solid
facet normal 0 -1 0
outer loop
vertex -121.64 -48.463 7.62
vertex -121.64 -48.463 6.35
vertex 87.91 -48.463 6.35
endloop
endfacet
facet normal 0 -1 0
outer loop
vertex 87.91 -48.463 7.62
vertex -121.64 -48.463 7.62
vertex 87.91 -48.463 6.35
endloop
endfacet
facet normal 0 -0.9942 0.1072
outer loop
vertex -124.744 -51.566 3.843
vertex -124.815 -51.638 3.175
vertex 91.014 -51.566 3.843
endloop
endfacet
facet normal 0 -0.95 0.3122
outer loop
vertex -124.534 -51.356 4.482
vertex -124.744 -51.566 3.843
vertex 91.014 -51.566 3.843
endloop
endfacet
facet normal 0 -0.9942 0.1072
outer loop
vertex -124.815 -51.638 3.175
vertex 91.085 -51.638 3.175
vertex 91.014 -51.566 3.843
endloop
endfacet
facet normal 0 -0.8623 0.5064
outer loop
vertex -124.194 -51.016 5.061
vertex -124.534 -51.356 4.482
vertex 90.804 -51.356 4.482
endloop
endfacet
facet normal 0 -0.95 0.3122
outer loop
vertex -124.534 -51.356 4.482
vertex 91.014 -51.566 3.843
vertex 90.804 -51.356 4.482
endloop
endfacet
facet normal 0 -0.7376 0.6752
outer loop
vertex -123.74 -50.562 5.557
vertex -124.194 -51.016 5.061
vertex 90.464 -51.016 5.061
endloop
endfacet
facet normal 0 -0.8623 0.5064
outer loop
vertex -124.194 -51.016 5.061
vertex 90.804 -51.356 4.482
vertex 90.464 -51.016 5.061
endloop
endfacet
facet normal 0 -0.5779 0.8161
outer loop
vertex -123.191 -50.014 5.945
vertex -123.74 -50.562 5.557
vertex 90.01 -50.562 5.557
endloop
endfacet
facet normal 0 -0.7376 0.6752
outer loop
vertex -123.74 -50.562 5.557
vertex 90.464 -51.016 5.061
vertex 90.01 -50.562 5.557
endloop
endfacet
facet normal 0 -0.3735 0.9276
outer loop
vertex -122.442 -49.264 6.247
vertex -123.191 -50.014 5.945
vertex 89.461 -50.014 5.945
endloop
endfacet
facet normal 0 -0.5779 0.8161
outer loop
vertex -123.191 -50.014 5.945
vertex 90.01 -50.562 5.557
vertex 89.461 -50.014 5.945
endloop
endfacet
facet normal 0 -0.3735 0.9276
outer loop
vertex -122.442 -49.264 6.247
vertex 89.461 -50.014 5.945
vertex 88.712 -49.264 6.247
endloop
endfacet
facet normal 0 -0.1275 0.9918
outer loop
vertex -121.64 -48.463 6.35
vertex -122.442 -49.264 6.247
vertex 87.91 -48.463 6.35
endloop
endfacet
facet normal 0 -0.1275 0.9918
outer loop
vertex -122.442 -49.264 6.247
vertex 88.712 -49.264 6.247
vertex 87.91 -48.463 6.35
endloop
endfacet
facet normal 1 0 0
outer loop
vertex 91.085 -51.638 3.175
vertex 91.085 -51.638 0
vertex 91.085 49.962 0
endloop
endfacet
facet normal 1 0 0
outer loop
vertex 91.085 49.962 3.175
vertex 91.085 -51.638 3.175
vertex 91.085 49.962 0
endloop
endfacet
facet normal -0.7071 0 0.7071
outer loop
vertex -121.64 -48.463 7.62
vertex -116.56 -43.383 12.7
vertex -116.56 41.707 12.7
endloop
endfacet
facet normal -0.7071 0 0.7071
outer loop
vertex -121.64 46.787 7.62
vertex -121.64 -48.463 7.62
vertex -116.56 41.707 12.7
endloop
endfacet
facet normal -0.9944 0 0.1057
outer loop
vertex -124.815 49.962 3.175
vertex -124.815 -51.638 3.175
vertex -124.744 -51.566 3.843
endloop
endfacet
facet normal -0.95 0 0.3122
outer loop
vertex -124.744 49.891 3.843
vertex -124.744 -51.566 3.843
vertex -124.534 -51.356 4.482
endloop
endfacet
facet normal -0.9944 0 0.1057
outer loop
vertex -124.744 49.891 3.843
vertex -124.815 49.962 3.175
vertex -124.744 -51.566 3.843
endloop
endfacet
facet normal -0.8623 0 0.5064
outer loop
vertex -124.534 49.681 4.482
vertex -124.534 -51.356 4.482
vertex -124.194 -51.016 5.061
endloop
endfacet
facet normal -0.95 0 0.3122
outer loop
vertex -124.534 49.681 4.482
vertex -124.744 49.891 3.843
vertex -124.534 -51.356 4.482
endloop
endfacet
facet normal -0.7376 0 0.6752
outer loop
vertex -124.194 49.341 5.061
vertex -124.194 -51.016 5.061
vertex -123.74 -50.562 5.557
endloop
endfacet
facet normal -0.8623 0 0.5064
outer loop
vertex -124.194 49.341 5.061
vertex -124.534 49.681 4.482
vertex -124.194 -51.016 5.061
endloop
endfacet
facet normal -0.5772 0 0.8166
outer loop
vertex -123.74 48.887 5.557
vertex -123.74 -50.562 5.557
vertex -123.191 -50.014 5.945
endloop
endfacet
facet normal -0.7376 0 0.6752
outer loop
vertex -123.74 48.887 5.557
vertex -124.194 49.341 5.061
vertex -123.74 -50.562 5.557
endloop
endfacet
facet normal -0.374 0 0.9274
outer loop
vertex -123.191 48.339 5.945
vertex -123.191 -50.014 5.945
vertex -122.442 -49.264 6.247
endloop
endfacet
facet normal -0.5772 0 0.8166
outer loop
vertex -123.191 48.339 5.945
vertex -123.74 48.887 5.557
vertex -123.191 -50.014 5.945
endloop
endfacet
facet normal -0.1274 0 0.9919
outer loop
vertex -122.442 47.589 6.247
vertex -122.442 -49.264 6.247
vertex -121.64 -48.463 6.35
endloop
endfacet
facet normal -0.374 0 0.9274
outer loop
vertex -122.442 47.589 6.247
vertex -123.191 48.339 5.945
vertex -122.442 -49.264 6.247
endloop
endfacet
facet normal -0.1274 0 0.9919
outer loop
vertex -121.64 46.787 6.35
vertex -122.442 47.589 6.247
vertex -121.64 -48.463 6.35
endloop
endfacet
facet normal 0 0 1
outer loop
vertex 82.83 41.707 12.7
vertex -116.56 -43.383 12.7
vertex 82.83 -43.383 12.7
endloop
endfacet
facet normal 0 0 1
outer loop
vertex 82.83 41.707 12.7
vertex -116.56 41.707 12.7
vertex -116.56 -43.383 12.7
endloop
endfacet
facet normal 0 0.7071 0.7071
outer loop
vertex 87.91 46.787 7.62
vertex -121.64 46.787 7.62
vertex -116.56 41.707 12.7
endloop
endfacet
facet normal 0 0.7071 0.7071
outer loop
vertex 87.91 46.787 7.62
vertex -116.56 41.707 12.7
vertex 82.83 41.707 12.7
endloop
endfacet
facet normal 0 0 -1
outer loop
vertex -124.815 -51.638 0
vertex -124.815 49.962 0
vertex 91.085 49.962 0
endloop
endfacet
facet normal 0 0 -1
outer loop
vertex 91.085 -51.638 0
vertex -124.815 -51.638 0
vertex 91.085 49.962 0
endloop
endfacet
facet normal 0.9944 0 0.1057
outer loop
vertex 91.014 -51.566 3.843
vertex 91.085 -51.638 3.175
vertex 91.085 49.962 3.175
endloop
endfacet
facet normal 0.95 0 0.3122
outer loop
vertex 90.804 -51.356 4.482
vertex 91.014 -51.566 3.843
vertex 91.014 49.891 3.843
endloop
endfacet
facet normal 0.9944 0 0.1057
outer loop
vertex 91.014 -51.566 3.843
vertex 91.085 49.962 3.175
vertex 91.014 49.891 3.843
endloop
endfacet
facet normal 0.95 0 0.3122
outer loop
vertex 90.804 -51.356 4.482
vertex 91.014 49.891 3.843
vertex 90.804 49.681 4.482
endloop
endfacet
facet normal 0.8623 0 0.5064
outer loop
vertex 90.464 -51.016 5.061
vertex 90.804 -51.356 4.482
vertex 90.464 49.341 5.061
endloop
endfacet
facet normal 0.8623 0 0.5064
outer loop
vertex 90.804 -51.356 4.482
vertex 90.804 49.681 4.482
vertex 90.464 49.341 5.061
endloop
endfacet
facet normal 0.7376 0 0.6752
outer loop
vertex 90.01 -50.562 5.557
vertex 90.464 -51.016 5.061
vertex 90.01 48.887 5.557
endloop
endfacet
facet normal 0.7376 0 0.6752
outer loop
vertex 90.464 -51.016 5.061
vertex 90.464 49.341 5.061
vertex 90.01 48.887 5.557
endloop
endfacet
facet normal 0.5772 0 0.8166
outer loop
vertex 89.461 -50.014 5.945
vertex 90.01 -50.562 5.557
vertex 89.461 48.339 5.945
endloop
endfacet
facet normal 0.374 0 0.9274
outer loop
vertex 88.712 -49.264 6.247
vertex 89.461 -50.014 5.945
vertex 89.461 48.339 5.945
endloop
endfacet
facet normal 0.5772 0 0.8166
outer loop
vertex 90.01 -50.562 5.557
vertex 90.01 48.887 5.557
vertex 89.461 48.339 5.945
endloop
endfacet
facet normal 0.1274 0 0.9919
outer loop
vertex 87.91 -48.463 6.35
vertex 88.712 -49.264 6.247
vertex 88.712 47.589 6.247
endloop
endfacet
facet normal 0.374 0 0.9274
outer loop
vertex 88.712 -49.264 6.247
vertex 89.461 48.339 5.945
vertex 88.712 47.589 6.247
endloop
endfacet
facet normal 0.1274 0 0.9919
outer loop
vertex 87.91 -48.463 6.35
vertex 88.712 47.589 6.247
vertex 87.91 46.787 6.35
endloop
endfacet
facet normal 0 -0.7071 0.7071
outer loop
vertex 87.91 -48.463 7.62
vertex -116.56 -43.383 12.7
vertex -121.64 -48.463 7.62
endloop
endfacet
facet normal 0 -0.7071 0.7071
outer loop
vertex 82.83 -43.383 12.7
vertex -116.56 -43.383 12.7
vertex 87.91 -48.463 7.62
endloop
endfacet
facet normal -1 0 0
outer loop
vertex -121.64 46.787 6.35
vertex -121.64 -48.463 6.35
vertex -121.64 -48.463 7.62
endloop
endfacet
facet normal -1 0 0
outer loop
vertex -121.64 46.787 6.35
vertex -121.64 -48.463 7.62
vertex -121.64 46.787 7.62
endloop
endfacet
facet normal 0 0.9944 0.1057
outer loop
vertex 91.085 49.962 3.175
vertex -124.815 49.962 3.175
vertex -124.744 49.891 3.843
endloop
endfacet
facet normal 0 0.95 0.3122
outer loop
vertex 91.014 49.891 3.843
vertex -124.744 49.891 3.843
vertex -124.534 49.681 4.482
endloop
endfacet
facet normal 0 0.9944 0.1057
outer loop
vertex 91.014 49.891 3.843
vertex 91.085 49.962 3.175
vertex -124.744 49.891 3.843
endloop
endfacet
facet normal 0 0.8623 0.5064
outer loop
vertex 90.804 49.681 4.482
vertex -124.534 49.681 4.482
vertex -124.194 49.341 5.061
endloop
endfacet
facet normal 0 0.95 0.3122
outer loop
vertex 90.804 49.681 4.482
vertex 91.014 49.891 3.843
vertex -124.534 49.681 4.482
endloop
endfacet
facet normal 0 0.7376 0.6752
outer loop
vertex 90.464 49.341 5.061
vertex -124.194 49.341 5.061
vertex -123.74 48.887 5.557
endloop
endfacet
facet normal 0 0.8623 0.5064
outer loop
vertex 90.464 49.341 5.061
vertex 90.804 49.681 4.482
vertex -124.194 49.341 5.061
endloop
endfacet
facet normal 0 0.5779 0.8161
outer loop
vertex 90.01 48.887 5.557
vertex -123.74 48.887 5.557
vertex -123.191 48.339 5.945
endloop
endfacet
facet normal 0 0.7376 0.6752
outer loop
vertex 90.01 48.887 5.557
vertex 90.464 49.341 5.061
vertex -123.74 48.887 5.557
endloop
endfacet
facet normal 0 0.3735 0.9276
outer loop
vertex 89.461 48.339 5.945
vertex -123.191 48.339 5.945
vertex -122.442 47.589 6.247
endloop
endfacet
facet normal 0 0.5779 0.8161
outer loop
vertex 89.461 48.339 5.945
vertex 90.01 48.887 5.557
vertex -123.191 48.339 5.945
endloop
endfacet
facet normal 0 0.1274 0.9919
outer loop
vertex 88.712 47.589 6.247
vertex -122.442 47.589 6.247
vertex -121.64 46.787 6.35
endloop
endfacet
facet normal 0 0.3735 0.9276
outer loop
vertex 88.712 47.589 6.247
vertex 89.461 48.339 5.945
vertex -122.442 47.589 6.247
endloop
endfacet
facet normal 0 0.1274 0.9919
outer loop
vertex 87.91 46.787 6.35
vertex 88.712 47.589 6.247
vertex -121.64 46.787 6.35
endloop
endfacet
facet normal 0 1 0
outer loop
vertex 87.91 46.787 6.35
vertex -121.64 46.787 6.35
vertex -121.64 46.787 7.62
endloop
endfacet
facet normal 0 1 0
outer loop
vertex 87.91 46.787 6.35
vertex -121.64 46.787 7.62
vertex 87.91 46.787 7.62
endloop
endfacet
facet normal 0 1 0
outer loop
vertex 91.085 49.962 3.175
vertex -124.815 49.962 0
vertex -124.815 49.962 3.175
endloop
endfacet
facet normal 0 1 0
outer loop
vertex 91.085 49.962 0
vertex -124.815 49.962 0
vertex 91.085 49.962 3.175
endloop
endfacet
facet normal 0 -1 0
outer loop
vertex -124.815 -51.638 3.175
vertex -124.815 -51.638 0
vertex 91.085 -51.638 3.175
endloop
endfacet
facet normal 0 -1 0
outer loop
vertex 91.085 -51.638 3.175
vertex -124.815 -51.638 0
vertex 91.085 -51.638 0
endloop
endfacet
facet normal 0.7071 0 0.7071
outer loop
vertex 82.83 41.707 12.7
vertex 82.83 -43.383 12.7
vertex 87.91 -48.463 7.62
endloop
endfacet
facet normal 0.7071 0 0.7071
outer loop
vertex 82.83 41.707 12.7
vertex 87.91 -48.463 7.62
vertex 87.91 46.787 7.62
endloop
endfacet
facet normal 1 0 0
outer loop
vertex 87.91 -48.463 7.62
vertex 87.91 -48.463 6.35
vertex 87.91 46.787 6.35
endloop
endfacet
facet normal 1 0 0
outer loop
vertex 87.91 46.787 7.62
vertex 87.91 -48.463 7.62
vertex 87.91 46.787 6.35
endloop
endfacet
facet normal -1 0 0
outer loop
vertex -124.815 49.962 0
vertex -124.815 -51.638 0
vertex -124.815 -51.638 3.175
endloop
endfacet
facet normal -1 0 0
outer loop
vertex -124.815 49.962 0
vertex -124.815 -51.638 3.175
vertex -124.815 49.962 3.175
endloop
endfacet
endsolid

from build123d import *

# Parameters (mm, degrees)
F0_W     = 215.9
F0_H     = 101.6
F1_DEPTH = 6.35
F2_R     = 3.175
F3_DEPTH = 6.35
F4_SIZE  = 5.08


with BuildPart() as f1:
    # F0 (on Top) → F1 (new body)
    with BuildSketch(Plane.XY):
        with Locations((-16.8649114484, -0.8375608661)):
            Rectangle(F0_W, F0_H)
    extrude(amount=F1_DEPTH)

    # F2
    f2_edges = [f1.edges().sort_by_distance(p)[0] for p in [
        (-16.864911, -51.637561, 6.35),
        (91.085089, -0.837561, 6.35),
        (-16.864911, 49.962439, 6.35),
        (-124.814911, -0.837561, 6.35),
    ]]
    fillet(f2_edges, radius=F2_R)

    # F3 (add): a face of the model
    f3_faces = [f1.faces().sort_by_distance(p)[0] for p in [
        (-16.8649114484, -0.8375608661, 6.35),
    ]]
    extrude(f3_faces, amount=F3_DEPTH)

    # F4
    f4_edges = [f1.edges().sort_by_distance(p)[0] for p in [
        (-16.864911, -48.462561, 12.7),
        (-121.639911, -0.837561, 12.7),
        (87.910089, -0.837561, 12.7),
        (-16.864911, 46.787439, 12.7),
    ]]
    chamfer(f4_edges, length=F4_SIZE)


solid = f1.part
